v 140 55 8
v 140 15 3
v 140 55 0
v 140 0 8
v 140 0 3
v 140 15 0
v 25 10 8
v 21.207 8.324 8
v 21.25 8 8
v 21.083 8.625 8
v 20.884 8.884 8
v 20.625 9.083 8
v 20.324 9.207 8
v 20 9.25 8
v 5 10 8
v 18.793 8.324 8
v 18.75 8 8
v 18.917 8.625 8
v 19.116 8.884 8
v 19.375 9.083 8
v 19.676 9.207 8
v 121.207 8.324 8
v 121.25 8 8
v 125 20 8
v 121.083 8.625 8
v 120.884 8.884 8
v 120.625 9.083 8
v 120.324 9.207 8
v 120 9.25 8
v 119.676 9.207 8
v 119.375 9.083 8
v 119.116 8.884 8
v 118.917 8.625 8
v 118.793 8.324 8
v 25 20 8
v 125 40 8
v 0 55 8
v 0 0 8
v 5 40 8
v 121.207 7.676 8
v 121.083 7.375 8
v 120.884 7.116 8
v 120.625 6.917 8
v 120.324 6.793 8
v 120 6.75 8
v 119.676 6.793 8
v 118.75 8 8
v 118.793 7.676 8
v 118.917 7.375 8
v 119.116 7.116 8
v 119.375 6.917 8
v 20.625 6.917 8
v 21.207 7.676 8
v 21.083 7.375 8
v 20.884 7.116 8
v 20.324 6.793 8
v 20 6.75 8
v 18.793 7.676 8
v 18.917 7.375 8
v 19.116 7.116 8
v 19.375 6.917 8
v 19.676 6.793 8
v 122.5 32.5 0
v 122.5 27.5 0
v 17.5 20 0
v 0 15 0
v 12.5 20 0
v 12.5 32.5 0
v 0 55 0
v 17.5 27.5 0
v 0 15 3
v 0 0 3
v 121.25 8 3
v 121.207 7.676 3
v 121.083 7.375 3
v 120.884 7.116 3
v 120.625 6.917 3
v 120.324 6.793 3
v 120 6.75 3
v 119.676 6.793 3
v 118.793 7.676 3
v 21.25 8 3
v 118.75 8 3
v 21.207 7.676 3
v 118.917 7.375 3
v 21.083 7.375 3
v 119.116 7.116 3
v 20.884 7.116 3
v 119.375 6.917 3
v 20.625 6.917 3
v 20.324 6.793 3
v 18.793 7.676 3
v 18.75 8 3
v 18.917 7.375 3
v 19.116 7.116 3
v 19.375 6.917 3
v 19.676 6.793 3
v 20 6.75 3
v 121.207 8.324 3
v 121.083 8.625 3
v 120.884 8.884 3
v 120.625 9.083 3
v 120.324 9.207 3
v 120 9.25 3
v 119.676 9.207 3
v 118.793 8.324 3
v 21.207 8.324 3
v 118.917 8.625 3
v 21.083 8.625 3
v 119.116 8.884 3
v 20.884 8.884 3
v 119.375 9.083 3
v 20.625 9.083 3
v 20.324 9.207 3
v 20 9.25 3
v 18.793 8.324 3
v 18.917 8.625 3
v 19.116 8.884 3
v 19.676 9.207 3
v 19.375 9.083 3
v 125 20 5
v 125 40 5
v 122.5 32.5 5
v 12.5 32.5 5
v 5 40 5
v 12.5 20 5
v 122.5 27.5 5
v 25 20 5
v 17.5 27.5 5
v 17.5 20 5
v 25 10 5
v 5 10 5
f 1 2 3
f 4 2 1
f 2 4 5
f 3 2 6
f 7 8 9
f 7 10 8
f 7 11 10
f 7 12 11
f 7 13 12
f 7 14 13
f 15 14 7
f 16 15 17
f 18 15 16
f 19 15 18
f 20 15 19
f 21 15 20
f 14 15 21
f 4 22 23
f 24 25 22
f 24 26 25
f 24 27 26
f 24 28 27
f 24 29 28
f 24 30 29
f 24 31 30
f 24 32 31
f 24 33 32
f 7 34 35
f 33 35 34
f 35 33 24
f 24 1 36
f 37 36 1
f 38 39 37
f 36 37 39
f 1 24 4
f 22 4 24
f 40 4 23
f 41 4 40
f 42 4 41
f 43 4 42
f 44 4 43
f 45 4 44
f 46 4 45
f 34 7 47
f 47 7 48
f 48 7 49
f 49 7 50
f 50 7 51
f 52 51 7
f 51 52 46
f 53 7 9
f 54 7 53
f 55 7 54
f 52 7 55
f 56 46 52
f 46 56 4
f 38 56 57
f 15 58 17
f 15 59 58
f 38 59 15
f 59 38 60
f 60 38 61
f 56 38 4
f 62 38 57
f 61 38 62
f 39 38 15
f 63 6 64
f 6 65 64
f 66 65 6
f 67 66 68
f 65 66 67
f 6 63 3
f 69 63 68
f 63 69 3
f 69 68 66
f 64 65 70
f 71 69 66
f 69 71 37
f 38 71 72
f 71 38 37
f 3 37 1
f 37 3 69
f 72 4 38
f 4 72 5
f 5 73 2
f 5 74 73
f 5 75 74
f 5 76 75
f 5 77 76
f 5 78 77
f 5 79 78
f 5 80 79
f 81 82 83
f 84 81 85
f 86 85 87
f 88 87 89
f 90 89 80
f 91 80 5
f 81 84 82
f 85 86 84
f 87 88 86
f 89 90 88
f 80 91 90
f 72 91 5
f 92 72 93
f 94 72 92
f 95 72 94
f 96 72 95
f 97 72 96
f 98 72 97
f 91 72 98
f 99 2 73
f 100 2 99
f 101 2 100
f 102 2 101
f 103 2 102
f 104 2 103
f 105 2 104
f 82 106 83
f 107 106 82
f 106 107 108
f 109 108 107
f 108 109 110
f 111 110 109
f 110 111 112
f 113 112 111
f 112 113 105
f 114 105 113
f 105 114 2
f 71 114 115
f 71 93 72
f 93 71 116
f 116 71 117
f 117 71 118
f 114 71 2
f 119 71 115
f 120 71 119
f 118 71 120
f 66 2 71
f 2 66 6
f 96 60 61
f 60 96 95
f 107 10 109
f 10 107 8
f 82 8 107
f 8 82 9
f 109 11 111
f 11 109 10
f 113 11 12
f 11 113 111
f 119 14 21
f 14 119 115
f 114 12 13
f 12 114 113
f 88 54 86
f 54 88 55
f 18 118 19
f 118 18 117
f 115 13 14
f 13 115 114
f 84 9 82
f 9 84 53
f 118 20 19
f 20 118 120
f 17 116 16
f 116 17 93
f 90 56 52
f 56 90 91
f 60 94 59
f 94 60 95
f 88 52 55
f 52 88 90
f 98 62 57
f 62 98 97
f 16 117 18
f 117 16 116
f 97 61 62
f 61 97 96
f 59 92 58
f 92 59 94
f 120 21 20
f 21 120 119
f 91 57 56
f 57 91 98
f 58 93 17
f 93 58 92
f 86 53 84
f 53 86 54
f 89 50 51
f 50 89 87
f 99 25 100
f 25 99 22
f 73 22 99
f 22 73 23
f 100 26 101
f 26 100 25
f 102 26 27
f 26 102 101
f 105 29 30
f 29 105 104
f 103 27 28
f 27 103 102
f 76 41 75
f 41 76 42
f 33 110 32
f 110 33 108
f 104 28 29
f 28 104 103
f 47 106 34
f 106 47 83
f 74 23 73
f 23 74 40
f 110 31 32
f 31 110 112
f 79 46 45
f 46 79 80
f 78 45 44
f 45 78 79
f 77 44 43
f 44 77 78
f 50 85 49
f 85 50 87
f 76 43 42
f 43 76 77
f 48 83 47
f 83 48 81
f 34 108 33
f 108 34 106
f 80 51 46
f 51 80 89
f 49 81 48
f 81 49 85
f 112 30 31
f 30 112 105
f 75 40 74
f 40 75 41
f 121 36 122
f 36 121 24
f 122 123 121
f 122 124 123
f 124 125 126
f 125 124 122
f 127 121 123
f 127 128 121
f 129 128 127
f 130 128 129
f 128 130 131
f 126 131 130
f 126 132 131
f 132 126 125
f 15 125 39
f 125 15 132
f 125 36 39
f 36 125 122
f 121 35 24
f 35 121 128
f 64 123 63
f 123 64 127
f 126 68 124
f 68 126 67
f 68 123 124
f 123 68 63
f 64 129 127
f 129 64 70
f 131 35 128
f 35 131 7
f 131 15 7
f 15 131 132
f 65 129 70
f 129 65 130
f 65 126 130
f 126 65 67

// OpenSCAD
$fn=24;

difference(){
cube([140,55,8]);
cube([140,15,3]);
translate([20,8,0])cylinder(d=2.5,h=20);
translate([120,8,0])cylinder(d=2.5,h=20);
translate([5,20,5])cube([120,20,8]);
translate([12.5,27.5,0])cube([110,5,8]);
translate([5,10,5])cube([20,20,8]);
translate([12.5,20,0])cube([5,10,8]);
}
